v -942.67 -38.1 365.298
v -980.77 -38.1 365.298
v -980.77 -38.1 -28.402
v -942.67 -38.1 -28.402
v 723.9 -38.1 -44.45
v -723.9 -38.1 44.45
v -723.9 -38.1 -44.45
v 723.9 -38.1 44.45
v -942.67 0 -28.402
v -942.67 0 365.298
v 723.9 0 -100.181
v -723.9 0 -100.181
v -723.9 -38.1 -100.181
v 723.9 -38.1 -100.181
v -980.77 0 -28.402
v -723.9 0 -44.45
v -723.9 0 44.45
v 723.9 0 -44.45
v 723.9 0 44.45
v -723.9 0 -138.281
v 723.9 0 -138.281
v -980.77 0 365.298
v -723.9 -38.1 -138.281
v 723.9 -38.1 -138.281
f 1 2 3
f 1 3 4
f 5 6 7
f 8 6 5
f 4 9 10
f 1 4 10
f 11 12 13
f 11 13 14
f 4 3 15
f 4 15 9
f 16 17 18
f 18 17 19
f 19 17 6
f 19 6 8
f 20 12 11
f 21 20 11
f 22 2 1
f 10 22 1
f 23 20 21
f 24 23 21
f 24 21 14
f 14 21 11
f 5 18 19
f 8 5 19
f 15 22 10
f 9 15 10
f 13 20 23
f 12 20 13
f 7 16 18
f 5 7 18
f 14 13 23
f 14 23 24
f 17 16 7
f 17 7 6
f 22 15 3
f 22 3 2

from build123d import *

# Parameters (mm, degrees)
F0_W     = 1447.8
F0_H     = 88.9
F1_DEPTH = 38.1
F2_W     = 1447.8
F2_H     = 38.1
F3_DEPTH = 38.1
F4_W     = 38.1
F4_H     = 393.7
F5_DEPTH = 38.1


with BuildPart() as f1:
    # F0 (on Front) → F1 (new body)
    with BuildSketch(Plane.XZ):
        Rectangle(F0_W, F0_H)
    extrude(amount=F1_DEPTH)


with BuildPart() as f3:
    # F2 (on Front) → F3 (new body)
    with BuildSketch(Plane.XZ):
        with Locations((0, -119.230582)):
            Rectangle(F2_W, F2_H)
    extrude(amount=F3_DEPTH)


with BuildPart() as f5:
    # F4 (on Front) → F5 (new body)
    with BuildSketch(Plane.XZ):
        with Locations((-961.719573, 168.448036)):
            Rectangle(F4_W, F4_H)
    extrude(amount=F5_DEPTH)


solid = Compound([f1.part, f3.part, f5.part])
